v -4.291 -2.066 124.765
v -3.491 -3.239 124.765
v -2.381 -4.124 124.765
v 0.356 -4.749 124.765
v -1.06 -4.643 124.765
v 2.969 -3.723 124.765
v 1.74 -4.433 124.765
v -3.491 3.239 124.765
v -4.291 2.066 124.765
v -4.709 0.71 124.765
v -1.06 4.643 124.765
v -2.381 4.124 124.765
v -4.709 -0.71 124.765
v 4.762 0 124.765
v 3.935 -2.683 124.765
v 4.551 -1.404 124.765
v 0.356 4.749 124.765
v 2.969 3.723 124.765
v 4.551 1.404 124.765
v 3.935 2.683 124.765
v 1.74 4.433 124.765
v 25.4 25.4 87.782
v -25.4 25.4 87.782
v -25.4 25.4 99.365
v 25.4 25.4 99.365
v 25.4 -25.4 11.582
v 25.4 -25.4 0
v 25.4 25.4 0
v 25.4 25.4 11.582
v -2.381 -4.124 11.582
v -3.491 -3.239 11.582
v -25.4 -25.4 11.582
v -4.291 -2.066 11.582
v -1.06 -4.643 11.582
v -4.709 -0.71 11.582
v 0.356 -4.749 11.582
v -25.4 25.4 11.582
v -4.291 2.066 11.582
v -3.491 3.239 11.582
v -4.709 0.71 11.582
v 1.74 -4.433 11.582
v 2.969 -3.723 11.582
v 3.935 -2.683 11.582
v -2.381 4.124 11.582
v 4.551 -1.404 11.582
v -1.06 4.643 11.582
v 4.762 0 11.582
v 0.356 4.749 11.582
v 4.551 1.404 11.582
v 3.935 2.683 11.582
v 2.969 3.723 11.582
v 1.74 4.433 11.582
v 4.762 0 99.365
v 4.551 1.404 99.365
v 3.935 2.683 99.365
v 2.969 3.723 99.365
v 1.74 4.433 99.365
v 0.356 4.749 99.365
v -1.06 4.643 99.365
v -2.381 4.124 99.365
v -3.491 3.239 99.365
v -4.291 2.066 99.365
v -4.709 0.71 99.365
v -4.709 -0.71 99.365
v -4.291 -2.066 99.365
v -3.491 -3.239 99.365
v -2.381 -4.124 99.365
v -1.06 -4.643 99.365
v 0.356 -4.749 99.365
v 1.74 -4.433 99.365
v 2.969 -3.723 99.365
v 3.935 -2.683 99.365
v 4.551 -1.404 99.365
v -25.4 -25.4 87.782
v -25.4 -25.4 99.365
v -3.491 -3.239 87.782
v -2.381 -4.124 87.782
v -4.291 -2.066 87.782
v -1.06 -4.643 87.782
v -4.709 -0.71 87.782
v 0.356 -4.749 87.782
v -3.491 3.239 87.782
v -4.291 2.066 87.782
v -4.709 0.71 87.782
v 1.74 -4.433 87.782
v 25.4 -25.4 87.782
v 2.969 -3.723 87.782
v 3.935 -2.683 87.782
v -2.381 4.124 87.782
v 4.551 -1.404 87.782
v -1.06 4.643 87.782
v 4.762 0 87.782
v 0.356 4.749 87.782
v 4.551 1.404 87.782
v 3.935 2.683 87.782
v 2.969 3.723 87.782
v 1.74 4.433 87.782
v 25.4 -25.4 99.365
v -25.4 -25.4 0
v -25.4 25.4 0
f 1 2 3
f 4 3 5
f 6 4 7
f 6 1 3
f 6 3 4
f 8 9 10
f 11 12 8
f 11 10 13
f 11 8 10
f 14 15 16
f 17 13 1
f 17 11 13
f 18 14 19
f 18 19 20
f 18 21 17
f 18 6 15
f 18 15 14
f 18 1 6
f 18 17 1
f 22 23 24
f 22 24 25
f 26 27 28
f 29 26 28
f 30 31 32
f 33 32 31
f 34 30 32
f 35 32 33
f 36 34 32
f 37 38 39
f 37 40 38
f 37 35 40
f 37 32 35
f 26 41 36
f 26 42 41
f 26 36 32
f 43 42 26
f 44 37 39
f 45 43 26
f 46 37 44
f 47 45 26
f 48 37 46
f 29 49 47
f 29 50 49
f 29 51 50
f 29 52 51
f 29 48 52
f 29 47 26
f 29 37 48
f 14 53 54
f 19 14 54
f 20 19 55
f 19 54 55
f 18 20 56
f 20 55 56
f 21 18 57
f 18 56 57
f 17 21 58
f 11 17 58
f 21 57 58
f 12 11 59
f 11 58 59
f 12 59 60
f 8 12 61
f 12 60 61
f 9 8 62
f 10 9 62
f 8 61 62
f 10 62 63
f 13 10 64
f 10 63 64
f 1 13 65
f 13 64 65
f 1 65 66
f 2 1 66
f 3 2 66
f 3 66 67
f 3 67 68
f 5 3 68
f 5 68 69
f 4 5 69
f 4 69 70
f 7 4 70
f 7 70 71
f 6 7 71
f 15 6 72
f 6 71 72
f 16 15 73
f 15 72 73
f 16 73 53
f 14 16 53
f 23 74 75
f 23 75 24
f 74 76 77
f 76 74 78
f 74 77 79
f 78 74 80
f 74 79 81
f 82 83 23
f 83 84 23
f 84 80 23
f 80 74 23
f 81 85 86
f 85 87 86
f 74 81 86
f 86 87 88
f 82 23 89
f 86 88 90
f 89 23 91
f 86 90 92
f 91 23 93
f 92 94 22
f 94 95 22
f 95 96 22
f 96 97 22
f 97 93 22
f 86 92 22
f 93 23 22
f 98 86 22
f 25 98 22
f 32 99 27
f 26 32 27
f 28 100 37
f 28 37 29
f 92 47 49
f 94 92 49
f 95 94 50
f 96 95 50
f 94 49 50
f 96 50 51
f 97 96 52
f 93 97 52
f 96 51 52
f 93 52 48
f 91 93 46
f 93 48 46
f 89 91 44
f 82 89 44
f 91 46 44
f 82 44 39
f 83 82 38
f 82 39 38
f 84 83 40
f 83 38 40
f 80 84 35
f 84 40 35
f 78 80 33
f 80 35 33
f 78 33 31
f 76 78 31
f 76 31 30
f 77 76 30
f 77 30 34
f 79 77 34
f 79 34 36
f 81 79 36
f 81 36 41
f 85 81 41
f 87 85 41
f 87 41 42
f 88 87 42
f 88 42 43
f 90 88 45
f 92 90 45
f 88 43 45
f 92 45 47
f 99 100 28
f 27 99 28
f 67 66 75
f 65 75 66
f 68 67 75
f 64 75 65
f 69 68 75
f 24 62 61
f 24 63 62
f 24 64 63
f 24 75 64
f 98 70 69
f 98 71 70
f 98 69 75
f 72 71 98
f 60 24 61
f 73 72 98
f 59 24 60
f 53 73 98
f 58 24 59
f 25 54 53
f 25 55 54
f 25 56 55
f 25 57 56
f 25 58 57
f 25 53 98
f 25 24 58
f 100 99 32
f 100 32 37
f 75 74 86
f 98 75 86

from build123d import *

# Parameters (mm, degrees)
F0_W     = 50.8
F0_H     = 50.8
F1_DEPTH = 11.5824
F2_R     = 4.7625
F3_DEPTH = 76.2
F4_W     = 50.8
F4_H     = 50.8
F4_R     = 4.7625
F5_DEPTH = 11.5824
F6_R     = 4.7625
F7_DEPTH = 25.4


with BuildPart() as f1:
    # F0 (on Top) → F1 (new body)
    with BuildSketch(Plane.XY):
        Rectangle(F0_W, F0_H)
    extrude(amount=F1_DEPTH)

    # F2 (on face) → F3 (join)
    with BuildSketch(Plane.XY.offset(11.5824)):
        Circle(F2_R)
    extrude(amount=F3_DEPTH)

    # F4 (on face) → F5 (join)
    with BuildSketch(Plane.XY.offset(87.7824)):
        Rectangle(F4_W, F4_H)
        Circle(F4_R, mode=Mode.SUBTRACT)
        Circle(F4_R)
    extrude(amount=F5_DEPTH)

    # F6 (on face) → F7 (join)
    with BuildSketch(Plane.XY.offset(99.3648)):
        Circle(F6_R)
    extrude(amount=F7_DEPTH)


solid = f1.part
